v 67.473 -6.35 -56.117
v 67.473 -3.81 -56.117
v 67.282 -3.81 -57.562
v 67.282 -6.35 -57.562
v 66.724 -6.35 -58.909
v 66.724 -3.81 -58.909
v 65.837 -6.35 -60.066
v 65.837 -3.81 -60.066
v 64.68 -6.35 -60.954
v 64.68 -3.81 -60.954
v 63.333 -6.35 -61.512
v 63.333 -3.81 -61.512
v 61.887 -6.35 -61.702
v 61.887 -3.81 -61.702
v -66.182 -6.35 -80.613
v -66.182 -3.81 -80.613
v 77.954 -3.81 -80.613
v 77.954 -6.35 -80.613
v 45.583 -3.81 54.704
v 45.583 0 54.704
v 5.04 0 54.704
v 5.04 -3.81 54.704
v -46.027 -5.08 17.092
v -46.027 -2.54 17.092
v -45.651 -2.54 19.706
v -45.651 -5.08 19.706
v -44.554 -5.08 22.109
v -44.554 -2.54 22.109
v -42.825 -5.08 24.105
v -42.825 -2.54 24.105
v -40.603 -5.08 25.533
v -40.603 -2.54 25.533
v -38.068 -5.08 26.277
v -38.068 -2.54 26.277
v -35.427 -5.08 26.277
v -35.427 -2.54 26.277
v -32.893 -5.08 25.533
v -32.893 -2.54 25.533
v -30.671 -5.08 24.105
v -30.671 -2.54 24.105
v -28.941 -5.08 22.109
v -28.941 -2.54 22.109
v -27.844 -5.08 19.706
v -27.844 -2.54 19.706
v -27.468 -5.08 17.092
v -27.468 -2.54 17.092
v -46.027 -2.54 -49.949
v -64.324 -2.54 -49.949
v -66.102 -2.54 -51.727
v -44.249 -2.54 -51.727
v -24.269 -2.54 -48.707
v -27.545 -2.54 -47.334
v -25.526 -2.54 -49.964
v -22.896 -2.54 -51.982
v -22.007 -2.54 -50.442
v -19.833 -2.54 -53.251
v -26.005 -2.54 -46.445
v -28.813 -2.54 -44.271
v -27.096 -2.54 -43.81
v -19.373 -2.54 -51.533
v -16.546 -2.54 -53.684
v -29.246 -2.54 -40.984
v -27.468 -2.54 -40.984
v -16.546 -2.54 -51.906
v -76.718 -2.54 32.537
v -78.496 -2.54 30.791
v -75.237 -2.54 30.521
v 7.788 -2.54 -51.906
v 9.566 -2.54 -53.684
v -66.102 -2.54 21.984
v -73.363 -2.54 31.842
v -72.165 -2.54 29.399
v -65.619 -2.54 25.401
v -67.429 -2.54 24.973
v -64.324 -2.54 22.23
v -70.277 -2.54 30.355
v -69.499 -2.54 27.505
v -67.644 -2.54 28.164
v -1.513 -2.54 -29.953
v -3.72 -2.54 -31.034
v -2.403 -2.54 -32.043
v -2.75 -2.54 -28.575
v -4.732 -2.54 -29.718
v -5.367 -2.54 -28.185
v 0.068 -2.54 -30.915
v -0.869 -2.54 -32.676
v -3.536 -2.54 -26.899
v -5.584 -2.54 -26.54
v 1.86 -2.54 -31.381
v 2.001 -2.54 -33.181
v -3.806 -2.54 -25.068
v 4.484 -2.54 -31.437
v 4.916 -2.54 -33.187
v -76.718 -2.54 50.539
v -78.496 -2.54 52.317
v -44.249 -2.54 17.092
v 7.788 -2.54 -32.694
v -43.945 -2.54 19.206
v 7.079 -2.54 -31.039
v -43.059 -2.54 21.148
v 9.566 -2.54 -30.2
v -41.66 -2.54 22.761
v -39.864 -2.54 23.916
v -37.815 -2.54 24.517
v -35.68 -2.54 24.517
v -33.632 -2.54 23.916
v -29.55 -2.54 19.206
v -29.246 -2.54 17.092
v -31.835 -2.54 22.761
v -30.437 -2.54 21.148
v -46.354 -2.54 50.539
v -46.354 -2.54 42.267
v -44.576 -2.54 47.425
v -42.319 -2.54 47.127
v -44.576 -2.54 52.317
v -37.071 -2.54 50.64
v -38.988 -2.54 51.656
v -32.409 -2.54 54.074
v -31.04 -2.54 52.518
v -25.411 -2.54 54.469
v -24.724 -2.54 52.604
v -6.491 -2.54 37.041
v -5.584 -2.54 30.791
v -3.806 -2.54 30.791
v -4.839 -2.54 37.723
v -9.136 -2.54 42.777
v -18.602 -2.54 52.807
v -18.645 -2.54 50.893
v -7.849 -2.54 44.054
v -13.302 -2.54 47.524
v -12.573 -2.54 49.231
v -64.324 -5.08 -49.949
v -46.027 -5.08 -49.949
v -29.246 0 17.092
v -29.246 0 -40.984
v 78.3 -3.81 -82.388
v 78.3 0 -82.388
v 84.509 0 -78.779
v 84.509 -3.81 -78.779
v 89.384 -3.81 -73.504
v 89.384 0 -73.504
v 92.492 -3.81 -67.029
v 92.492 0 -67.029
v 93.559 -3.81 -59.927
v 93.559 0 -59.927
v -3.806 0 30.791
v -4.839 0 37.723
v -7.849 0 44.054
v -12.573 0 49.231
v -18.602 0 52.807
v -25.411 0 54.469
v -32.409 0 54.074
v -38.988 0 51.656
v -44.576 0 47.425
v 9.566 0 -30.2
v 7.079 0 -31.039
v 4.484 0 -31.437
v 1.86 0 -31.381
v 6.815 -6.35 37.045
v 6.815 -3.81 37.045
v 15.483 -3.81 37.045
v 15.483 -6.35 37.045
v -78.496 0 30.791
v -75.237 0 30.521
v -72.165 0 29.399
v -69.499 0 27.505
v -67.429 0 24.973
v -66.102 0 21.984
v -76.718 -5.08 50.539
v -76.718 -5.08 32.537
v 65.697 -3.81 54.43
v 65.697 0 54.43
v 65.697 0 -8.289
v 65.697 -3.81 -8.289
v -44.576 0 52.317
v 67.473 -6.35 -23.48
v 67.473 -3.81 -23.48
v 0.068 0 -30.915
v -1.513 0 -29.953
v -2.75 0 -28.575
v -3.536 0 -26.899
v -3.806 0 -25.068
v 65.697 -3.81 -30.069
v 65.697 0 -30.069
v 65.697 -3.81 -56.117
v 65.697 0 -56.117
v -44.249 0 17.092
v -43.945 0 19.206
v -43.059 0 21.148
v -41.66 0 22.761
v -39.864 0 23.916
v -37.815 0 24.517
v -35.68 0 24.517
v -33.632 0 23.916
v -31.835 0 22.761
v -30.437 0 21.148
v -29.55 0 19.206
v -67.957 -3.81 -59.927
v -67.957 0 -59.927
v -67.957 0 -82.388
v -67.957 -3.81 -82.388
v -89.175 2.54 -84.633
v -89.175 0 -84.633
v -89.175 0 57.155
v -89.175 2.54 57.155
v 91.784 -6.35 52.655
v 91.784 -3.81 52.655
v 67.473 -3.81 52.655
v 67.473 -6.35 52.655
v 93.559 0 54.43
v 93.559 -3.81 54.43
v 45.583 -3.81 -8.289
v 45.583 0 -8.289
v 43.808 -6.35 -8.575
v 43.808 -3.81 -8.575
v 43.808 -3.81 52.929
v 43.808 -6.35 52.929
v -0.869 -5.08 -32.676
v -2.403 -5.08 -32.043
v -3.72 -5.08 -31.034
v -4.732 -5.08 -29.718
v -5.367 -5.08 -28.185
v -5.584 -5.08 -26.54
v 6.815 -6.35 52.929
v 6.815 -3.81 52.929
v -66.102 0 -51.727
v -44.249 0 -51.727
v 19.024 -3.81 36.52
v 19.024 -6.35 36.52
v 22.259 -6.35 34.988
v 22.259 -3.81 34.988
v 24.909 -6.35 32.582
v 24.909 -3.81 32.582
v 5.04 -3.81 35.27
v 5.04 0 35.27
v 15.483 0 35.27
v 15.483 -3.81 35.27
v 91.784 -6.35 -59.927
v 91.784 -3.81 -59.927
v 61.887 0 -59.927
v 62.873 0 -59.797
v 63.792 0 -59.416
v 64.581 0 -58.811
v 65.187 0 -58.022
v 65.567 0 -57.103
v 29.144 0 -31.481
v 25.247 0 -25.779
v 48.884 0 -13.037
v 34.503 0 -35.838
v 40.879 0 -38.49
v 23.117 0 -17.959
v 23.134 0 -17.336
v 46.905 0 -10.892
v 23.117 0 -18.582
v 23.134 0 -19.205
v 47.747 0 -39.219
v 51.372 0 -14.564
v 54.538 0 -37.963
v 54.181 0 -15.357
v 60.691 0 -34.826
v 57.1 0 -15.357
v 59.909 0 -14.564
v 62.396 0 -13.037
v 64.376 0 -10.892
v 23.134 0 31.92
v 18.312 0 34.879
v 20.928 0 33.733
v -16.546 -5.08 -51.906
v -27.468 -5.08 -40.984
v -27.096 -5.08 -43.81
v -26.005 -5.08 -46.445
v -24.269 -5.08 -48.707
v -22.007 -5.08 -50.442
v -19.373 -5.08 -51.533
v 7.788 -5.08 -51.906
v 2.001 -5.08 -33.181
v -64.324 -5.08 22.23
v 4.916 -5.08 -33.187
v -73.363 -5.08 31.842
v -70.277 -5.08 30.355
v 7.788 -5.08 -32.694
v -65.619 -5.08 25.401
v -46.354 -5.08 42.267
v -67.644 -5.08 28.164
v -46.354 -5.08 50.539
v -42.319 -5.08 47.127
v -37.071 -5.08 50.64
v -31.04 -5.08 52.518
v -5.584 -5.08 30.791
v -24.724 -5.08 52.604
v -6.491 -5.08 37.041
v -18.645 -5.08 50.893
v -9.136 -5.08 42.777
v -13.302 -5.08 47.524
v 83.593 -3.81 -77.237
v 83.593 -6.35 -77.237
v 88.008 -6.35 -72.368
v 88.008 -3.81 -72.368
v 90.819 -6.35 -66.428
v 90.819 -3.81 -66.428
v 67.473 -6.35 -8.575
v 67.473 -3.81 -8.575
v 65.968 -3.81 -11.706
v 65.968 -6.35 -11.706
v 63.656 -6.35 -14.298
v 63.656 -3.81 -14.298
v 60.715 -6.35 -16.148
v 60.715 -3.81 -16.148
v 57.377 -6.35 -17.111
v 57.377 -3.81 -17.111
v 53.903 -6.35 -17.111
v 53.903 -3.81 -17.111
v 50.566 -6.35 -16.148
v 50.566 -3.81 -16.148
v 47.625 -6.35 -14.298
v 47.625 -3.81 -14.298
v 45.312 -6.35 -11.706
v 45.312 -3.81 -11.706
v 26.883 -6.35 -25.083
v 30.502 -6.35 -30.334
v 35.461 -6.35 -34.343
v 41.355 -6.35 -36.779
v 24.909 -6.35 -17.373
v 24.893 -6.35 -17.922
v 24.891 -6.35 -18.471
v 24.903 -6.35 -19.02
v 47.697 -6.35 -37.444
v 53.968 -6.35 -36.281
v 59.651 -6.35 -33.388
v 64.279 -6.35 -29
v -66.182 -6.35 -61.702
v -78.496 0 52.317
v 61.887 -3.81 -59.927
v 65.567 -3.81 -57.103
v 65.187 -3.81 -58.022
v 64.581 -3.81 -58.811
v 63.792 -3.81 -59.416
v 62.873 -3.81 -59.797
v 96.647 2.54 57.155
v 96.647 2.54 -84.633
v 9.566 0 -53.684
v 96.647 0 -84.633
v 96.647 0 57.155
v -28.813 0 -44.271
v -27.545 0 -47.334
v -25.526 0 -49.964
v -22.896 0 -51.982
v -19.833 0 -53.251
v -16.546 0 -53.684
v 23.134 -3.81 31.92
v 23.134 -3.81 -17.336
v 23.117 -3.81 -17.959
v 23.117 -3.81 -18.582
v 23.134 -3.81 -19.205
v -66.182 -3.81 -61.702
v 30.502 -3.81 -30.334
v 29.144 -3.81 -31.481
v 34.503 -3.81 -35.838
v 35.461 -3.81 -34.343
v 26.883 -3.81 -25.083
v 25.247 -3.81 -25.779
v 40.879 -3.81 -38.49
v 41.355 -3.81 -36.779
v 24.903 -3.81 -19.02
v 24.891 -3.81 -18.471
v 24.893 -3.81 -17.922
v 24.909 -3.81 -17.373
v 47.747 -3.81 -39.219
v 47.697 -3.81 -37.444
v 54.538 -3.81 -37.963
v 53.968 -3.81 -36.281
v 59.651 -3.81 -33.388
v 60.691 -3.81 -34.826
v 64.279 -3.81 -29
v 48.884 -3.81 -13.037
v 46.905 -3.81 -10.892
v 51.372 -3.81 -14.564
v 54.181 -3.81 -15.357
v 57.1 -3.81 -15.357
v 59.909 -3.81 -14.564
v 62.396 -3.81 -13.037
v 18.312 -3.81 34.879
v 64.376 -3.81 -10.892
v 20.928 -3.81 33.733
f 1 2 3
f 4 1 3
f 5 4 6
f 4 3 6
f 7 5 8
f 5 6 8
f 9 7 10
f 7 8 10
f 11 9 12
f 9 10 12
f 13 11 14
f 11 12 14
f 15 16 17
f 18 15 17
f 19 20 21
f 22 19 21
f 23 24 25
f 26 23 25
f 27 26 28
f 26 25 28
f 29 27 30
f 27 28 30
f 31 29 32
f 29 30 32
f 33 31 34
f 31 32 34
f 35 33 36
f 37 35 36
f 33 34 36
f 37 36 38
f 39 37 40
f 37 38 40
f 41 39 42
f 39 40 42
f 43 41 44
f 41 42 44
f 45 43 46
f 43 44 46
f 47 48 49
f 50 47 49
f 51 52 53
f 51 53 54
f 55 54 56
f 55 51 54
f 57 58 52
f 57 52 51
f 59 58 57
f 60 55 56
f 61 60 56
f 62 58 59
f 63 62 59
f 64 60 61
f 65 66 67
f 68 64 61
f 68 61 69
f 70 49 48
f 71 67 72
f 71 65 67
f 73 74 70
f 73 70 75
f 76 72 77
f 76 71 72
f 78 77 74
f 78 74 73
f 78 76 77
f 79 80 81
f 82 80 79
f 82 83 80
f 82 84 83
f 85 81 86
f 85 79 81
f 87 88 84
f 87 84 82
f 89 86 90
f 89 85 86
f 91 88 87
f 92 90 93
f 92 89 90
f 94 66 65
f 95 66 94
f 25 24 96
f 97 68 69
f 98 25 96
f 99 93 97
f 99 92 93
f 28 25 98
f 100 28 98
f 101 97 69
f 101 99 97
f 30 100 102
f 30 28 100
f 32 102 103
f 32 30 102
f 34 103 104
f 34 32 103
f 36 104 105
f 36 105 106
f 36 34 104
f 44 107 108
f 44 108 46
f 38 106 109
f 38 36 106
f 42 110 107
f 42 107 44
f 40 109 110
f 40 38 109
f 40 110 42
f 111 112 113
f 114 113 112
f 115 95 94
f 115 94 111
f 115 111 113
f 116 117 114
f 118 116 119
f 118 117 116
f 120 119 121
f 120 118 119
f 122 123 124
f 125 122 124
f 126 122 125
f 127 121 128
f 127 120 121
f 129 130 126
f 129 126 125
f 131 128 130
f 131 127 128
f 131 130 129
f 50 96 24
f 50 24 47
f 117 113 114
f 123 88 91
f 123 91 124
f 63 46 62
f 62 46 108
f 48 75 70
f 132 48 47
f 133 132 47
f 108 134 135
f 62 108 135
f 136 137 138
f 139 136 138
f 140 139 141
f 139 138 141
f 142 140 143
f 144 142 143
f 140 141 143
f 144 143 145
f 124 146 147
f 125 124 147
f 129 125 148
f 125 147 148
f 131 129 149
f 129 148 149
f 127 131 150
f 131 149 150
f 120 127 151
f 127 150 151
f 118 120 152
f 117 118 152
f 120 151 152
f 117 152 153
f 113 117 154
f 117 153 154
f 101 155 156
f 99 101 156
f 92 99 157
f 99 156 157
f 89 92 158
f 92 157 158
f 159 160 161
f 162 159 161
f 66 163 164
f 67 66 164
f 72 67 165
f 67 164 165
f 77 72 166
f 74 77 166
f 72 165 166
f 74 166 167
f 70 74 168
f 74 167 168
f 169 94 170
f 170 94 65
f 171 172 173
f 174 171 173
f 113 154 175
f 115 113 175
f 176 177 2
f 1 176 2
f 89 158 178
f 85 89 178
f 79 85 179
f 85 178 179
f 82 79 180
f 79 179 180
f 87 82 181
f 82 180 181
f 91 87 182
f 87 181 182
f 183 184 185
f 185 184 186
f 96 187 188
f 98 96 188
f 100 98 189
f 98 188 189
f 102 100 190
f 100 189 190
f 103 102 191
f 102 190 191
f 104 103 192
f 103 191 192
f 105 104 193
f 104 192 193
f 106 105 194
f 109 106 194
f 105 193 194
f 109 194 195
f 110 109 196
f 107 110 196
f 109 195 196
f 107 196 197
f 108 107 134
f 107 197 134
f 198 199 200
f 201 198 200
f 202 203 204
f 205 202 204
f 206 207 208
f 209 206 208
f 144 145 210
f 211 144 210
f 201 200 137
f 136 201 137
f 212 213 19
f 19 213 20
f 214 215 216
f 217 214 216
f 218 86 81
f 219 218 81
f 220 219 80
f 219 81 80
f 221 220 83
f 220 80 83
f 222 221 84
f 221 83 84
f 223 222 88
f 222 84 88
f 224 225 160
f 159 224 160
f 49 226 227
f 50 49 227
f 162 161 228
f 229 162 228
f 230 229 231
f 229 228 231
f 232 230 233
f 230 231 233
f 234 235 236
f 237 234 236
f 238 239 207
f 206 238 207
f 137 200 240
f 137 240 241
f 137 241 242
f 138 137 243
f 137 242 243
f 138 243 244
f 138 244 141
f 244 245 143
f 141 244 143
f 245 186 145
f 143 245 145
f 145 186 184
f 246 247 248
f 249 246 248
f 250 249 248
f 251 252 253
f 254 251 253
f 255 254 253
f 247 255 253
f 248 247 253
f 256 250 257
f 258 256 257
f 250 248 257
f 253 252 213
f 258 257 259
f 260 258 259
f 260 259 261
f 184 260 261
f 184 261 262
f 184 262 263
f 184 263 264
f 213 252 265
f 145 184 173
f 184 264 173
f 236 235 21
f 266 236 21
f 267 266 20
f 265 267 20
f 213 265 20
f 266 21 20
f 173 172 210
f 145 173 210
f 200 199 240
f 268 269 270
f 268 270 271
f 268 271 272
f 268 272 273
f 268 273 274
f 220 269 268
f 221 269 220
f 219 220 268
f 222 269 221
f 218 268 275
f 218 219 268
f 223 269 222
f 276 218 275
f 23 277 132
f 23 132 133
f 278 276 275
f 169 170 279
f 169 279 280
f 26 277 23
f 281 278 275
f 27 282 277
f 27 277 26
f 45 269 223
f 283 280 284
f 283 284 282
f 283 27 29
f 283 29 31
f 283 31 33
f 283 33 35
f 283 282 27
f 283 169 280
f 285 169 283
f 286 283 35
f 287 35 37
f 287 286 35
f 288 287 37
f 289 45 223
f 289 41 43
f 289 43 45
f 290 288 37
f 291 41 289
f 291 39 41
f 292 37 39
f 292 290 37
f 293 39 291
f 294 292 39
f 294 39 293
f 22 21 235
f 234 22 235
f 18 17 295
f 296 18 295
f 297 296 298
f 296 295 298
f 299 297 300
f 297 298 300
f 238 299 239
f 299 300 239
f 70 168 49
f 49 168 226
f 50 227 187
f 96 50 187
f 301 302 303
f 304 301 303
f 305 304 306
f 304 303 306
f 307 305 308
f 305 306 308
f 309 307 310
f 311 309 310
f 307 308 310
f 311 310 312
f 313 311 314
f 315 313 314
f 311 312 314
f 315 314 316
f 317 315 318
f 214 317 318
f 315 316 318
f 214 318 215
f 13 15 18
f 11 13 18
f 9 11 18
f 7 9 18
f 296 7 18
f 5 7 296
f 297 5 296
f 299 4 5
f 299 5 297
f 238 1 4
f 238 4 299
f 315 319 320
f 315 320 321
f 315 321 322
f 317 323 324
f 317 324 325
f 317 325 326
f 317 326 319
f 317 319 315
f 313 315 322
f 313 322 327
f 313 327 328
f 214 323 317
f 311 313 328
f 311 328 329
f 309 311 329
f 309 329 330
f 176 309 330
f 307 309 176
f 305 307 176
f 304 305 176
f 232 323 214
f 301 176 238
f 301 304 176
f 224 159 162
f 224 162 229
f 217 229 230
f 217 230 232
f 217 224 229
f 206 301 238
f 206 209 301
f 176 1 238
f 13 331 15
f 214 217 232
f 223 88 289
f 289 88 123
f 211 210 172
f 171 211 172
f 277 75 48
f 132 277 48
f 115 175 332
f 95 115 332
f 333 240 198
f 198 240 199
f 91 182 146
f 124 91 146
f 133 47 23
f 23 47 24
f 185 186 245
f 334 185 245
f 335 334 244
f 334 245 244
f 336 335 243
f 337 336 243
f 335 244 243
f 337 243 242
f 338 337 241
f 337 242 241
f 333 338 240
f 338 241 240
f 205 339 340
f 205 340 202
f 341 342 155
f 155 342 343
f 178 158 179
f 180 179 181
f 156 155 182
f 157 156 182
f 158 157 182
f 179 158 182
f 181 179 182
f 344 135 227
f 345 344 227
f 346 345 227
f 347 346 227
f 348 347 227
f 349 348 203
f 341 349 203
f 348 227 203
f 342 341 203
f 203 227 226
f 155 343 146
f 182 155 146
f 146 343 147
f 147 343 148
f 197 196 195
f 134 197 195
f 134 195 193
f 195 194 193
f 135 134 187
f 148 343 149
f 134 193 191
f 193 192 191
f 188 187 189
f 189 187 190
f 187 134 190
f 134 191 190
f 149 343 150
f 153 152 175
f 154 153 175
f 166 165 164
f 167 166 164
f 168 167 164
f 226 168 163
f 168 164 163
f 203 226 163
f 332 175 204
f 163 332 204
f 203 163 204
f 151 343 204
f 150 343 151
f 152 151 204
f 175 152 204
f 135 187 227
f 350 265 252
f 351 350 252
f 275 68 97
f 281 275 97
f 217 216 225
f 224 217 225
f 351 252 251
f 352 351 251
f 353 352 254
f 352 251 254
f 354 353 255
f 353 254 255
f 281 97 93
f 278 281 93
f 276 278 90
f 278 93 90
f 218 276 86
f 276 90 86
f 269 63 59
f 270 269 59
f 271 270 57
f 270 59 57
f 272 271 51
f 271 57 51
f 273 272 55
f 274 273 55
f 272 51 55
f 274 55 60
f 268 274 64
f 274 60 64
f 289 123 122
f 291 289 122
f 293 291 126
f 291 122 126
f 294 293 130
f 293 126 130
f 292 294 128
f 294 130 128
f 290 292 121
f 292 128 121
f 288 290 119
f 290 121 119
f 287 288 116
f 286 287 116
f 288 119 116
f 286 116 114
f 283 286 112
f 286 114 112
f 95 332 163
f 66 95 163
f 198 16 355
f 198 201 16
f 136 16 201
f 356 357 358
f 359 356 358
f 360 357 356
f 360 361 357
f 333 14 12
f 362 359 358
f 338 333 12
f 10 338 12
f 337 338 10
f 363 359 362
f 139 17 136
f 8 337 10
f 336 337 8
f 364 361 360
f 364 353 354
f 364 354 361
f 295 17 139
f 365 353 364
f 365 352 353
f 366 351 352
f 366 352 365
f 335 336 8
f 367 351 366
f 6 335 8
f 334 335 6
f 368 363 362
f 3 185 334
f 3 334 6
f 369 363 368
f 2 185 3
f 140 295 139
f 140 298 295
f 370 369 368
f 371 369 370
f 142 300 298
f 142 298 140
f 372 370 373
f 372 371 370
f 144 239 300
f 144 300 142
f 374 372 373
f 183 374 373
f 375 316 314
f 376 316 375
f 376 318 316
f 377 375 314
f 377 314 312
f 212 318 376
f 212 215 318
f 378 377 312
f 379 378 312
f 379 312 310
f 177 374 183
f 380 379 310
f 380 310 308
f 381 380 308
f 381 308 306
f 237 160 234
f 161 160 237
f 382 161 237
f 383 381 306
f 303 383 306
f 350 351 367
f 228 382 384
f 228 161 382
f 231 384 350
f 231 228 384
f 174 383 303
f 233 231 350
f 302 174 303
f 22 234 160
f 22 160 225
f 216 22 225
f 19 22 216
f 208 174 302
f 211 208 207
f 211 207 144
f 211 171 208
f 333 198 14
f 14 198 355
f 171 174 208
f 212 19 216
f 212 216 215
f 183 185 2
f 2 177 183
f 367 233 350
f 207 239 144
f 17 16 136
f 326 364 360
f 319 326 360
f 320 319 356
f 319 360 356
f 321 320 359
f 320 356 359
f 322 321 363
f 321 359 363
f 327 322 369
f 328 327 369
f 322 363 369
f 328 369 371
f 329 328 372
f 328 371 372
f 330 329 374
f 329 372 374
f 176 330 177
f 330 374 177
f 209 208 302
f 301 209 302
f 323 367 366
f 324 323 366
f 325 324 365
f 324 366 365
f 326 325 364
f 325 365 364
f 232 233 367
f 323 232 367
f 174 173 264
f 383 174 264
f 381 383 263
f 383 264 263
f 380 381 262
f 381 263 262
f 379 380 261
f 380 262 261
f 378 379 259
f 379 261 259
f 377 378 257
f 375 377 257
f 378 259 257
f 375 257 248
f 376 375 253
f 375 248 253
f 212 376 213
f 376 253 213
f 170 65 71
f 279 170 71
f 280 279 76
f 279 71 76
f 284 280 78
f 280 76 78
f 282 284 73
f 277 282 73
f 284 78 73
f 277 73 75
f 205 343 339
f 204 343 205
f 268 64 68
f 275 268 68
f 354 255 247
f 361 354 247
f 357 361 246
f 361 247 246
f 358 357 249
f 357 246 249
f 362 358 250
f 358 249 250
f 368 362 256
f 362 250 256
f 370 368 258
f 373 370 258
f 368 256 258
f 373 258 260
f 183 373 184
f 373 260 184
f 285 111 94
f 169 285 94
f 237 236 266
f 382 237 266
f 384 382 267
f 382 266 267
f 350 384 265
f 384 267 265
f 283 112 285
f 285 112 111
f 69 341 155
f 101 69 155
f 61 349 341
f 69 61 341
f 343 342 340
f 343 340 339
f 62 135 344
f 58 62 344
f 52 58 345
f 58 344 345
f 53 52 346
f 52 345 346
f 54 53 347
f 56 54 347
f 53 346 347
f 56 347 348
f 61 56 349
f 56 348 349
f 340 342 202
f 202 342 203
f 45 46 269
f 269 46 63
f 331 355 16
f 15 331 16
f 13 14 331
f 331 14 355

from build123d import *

# Parameters (mm, degrees)
F1_DEPTH = 3.81
F2_W     = 185.822121799
F2_H     = 141.7885944247
F3_DEPTH = 2.54
F5_DEPTH = 2.54
F7_DEPTH = 2.54
F9_DEPTH = 2.54


# Not quite as in the source:
# - a feature names something its author has since deleted; it is built from what else it names


with BuildPart() as f1:
    # F0 (on Front) → F1 (new body)
    with BuildSketch(Plane.XZ):
        with BuildLine():
            Line((61.8872972369, -59.9267967045), (-67.9568648338, -59.9267967045))
            Line((-67.9568648338, -59.9267967045), (-67.9568648338, -82.3878794909))
            Line((-67.9568648338, -82.3878794909), (78.2999321818, -82.3878794909))
            ThreePointArc((78.2999321818, -82.3878794909), (89.3836158058, -73.5038786726), (93.5593023896, -59.9267967045))
            Line((93.5593023896, -59.9267967045), (93.5593023896, 54.4298999012))
            Line((93.5593023896, 54.4298999012), (65.6972972369, 54.4298999012))
            Line((65.6972972369, 54.4298999012), (65.6972972369, -8.2891006023))
            ThreePointArc((65.6972972369, -8.2891006023), (55.6403416055, -15.4575892654), (45.5833859742, -8.2891006023))
            Line((45.5833859742, -8.2891006023), (45.5833859742, 54.7044351697))
            Line((45.5833859742, 54.7044351697), (5.0396709703, 54.7044351697))
            Line((5.0396709703, 54.7044351697), (5.0396709703, 35.2702587843))
            Line((5.0396709703, 35.2702587843), (15.4831645885, 35.2702587843))
            ThreePointArc((15.4831645885, 35.2702587843), (19.6591632782, 34.3958519091), (23.1335591525, 31.9195389748))
            Line((23.1335591525, 31.9195389748), (23.1335591525, -17.3360444605))
            Line((23.1335591525, -17.3360444605), (23.1335591525, -19.20456164))
            ThreePointArc((23.1335591525, -19.20456164), (40.879363735, -38.4902332098), (65.6972972369, -30.0687793642))
            Line((65.6972972369, -30.0687793642), (65.6972972369, -56.1167967045))
            ThreePointArc((65.6972972369, -56.1167967045), (64.5813740732, -58.8108735409), (61.8872972369, -59.9267967045))
        make_face()
        with BuildLine():
            ThreePointArc((23.1335591525, -17.3360444605), (23.1145151518, -18.2703030503), (23.1335591525, -19.20456164))
            Line((23.1335591525, -19.20456164), (23.1335591525, -17.3360444605))
        make_face()
    extrude(amount=F1_DEPTH)

    # F8 (on face) → F9 (join)
    with BuildSketch(Plane.XZ.offset(3.81)):
        with BuildLine():
            Line((67.4725060976, -23.4798739041), (67.4725060976, -56.1167967045))
            ThreePointArc((67.4725060976, -56.1167967045), (65.8366362966, -60.0661357642), (61.8872972369, -61.7020055652))
            Line((61.8872972369, -61.7020055652), (-66.1816559732, -61.7020055652))
            Line((-66.1816559732, -61.7020055652), (-66.1816559732, -80.6126706302))
            Line((-66.1816559732, -80.6126706302), (77.9542927434, -80.6126706302))
            ThreePointArc((77.9542927434, -80.6126706302), (88.0081874746, -72.3683477517), (91.784093529, -59.9267967045))
            Line((91.784093529, -59.9267967045), (91.784093529, 52.6546910405))
            Line((91.784093529, 52.6546910405), (67.4725060976, 52.6546910405))
            Line((67.4725060976, 52.6546910405), (67.4725060976, -8.5750017462))
            ThreePointArc((67.4725060976, -8.5750017462), (55.6403416055, -17.2327981261), (43.8081771135, -8.5750017462))
            Line((43.8081771135, -8.5750017462), (43.8081771135, 52.9292263091))
            Line((43.8081771135, 52.9292263091), (6.8148798309, 52.9292263091))
            Line((6.8148798309, 52.9292263091), (6.8148798309, 37.0454676449))
            Line((6.8148798309, 37.0454676449), (15.4831645885, 37.0454676449))
            ThreePointArc((15.4831645885, 37.0454676449), (20.6976230432, 35.8732781186), (24.9087680131, 32.5822504214))
            Line((24.9087680131, 32.5822504214), (24.9087680131, -17.3729597743))
            ThreePointArc((24.9087680131, -17.3729597743), (24.8898523858, -18.1966120898), (24.9030282278, -19.0203762156))
            ThreePointArc((24.9030282278, -19.0203762156), (44.5022080749, -37.3401368279), (67.4725060976, -23.4798739041))
        make_face()
    extrude(amount=F9_DEPTH)


with BuildPart() as f3:
    # F2 (on face) → F3 (new body)
    with BuildSketch(Plane(origin=(0, 0, 0), x_dir=(-1, 0, 0), z_dir=(0, 1, 0))):
        with Locations((-3.7357322872, -13.7389265001)):
            Rectangle(F2_W, F2_H)
    extrude(amount=F3_DEPTH)

    # F4 (on face) → F5 (join)
    with BuildSketch(Plane.XZ):
        with BuildLine():
            Line((-66.1017629318, 21.9844542444), (-66.1017629318, -51.7266206443))
            Line((-66.1017629318, -51.7266206443), (-44.2493627779, -51.7266206443))
            Line((-44.2493627779, -51.7266206443), (-44.2493627779, 17.092127353))
            ThreePointArc((-44.2493627779, 17.092127353), (-36.7477941327, 24.5936959982), (-29.2462254874, 17.092127353))
            Line((-29.2462254874, 17.092127353), (-29.2462254874, -40.983552891))
            ThreePointArc((-29.2462254874, -40.983552891), (-25.5264816085, -49.9638090121), (-16.5462254874, -53.683552891))
            Line((-16.5462254874, -53.683552891), (9.566242341, -53.683552891))
            Line((9.566242341, -53.683552891), (9.566242341, -30.2003771067))
            ThreePointArc((9.566242341, -30.2003771067), (5.7901732638, -31.2942255388), (1.8598167011, -31.380824371))
            ThreePointArc((1.8598167011, -31.380824371), (-2.1819158801, -29.3091628597), (-3.8061193191, -25.0677778425))
            Line((-3.8061193191, -25.0677778425), (-3.8061193191, 30.7906456292))
            ThreePointArc((-3.8061193191, 30.7906456292), (-18.6015771181, 52.8067259199), (-44.5755193941, 47.4245622754))
            Line((-44.5755193941, 47.4245622754), (-44.5755193941, 52.3168891668))
            Line((-44.5755193941, 52.3168891668), (-78.4956621937, 52.3168891668))
            Line((-78.4956621937, 52.3168891668), (-78.4956621937, 30.7906456292))
            ThreePointArc((-78.4956621937, 30.7906456292), (-70.7684925993, 28.5411928963), (-66.1017629318, 21.9844542444))
        make_face()
    extrude(amount=F5_DEPTH)

    # F6 (on face) → F7 (join)
    with BuildSketch(Plane.XZ.offset(2.54)):
        with BuildLine():
            Line((-76.7176621937, 50.5388891668), (-76.7176621937, 32.5374547699))
            ThreePointArc((-76.7176621937, 32.5374547699), (-68.8934526322, 29.3403456584), (-64.3237629318, 22.2299520002))
            Line((-64.3237629318, 22.2299520002), (-64.3237629318, -49.9486206443))
            Line((-64.3237629318, -49.9486206443), (-46.0273627779, -49.9486206443))
            Line((-46.0273627779, -49.9486206443), (-46.0273627779, 17.092127353))
            ThreePointArc((-46.0273627779, 17.092127353), (-36.7477941327, 26.3716959982), (-27.4682254874, 17.092127353))
            Line((-27.4682254874, 17.092127353), (-27.4682254874, -40.983552891))
            ThreePointArc((-27.4682254874, -40.983552891), (-24.2692457516, -48.7065731551), (-16.5462254874, -51.905552891))
            Line((-16.5462254874, -51.905552891), (7.788242341, -51.905552891))
            Line((7.788242341, -51.905552891), (7.788242341, -32.6938578527))
            ThreePointArc((7.788242341, -32.6938578527), (3.4584477385, -33.2470515492), (-0.8690068072, -32.6758408003))
            ThreePointArc((-0.8690068072, -32.6758408003), (-4.2691980449, -30.4090810578), (-5.5841193191, -26.5399103165))
            Line((-5.5841193191, -26.5399103165), (-5.5841193191, 30.7906456292))
            ThreePointArc((-5.5841193191, 30.7906456292), (-21.6228421821, 51.9676094036), (-46.3535193941, 42.2671954734))
            Line((-46.3535193941, 42.2671954734), (-46.3535193941, 50.5388891668))
            Line((-46.3535193941, 50.5388891668), (-76.7176621937, 50.5388891668))
        make_face()
    extrude(amount=F7_DEPTH)


solid = Compound([f1.part, f3.part])
